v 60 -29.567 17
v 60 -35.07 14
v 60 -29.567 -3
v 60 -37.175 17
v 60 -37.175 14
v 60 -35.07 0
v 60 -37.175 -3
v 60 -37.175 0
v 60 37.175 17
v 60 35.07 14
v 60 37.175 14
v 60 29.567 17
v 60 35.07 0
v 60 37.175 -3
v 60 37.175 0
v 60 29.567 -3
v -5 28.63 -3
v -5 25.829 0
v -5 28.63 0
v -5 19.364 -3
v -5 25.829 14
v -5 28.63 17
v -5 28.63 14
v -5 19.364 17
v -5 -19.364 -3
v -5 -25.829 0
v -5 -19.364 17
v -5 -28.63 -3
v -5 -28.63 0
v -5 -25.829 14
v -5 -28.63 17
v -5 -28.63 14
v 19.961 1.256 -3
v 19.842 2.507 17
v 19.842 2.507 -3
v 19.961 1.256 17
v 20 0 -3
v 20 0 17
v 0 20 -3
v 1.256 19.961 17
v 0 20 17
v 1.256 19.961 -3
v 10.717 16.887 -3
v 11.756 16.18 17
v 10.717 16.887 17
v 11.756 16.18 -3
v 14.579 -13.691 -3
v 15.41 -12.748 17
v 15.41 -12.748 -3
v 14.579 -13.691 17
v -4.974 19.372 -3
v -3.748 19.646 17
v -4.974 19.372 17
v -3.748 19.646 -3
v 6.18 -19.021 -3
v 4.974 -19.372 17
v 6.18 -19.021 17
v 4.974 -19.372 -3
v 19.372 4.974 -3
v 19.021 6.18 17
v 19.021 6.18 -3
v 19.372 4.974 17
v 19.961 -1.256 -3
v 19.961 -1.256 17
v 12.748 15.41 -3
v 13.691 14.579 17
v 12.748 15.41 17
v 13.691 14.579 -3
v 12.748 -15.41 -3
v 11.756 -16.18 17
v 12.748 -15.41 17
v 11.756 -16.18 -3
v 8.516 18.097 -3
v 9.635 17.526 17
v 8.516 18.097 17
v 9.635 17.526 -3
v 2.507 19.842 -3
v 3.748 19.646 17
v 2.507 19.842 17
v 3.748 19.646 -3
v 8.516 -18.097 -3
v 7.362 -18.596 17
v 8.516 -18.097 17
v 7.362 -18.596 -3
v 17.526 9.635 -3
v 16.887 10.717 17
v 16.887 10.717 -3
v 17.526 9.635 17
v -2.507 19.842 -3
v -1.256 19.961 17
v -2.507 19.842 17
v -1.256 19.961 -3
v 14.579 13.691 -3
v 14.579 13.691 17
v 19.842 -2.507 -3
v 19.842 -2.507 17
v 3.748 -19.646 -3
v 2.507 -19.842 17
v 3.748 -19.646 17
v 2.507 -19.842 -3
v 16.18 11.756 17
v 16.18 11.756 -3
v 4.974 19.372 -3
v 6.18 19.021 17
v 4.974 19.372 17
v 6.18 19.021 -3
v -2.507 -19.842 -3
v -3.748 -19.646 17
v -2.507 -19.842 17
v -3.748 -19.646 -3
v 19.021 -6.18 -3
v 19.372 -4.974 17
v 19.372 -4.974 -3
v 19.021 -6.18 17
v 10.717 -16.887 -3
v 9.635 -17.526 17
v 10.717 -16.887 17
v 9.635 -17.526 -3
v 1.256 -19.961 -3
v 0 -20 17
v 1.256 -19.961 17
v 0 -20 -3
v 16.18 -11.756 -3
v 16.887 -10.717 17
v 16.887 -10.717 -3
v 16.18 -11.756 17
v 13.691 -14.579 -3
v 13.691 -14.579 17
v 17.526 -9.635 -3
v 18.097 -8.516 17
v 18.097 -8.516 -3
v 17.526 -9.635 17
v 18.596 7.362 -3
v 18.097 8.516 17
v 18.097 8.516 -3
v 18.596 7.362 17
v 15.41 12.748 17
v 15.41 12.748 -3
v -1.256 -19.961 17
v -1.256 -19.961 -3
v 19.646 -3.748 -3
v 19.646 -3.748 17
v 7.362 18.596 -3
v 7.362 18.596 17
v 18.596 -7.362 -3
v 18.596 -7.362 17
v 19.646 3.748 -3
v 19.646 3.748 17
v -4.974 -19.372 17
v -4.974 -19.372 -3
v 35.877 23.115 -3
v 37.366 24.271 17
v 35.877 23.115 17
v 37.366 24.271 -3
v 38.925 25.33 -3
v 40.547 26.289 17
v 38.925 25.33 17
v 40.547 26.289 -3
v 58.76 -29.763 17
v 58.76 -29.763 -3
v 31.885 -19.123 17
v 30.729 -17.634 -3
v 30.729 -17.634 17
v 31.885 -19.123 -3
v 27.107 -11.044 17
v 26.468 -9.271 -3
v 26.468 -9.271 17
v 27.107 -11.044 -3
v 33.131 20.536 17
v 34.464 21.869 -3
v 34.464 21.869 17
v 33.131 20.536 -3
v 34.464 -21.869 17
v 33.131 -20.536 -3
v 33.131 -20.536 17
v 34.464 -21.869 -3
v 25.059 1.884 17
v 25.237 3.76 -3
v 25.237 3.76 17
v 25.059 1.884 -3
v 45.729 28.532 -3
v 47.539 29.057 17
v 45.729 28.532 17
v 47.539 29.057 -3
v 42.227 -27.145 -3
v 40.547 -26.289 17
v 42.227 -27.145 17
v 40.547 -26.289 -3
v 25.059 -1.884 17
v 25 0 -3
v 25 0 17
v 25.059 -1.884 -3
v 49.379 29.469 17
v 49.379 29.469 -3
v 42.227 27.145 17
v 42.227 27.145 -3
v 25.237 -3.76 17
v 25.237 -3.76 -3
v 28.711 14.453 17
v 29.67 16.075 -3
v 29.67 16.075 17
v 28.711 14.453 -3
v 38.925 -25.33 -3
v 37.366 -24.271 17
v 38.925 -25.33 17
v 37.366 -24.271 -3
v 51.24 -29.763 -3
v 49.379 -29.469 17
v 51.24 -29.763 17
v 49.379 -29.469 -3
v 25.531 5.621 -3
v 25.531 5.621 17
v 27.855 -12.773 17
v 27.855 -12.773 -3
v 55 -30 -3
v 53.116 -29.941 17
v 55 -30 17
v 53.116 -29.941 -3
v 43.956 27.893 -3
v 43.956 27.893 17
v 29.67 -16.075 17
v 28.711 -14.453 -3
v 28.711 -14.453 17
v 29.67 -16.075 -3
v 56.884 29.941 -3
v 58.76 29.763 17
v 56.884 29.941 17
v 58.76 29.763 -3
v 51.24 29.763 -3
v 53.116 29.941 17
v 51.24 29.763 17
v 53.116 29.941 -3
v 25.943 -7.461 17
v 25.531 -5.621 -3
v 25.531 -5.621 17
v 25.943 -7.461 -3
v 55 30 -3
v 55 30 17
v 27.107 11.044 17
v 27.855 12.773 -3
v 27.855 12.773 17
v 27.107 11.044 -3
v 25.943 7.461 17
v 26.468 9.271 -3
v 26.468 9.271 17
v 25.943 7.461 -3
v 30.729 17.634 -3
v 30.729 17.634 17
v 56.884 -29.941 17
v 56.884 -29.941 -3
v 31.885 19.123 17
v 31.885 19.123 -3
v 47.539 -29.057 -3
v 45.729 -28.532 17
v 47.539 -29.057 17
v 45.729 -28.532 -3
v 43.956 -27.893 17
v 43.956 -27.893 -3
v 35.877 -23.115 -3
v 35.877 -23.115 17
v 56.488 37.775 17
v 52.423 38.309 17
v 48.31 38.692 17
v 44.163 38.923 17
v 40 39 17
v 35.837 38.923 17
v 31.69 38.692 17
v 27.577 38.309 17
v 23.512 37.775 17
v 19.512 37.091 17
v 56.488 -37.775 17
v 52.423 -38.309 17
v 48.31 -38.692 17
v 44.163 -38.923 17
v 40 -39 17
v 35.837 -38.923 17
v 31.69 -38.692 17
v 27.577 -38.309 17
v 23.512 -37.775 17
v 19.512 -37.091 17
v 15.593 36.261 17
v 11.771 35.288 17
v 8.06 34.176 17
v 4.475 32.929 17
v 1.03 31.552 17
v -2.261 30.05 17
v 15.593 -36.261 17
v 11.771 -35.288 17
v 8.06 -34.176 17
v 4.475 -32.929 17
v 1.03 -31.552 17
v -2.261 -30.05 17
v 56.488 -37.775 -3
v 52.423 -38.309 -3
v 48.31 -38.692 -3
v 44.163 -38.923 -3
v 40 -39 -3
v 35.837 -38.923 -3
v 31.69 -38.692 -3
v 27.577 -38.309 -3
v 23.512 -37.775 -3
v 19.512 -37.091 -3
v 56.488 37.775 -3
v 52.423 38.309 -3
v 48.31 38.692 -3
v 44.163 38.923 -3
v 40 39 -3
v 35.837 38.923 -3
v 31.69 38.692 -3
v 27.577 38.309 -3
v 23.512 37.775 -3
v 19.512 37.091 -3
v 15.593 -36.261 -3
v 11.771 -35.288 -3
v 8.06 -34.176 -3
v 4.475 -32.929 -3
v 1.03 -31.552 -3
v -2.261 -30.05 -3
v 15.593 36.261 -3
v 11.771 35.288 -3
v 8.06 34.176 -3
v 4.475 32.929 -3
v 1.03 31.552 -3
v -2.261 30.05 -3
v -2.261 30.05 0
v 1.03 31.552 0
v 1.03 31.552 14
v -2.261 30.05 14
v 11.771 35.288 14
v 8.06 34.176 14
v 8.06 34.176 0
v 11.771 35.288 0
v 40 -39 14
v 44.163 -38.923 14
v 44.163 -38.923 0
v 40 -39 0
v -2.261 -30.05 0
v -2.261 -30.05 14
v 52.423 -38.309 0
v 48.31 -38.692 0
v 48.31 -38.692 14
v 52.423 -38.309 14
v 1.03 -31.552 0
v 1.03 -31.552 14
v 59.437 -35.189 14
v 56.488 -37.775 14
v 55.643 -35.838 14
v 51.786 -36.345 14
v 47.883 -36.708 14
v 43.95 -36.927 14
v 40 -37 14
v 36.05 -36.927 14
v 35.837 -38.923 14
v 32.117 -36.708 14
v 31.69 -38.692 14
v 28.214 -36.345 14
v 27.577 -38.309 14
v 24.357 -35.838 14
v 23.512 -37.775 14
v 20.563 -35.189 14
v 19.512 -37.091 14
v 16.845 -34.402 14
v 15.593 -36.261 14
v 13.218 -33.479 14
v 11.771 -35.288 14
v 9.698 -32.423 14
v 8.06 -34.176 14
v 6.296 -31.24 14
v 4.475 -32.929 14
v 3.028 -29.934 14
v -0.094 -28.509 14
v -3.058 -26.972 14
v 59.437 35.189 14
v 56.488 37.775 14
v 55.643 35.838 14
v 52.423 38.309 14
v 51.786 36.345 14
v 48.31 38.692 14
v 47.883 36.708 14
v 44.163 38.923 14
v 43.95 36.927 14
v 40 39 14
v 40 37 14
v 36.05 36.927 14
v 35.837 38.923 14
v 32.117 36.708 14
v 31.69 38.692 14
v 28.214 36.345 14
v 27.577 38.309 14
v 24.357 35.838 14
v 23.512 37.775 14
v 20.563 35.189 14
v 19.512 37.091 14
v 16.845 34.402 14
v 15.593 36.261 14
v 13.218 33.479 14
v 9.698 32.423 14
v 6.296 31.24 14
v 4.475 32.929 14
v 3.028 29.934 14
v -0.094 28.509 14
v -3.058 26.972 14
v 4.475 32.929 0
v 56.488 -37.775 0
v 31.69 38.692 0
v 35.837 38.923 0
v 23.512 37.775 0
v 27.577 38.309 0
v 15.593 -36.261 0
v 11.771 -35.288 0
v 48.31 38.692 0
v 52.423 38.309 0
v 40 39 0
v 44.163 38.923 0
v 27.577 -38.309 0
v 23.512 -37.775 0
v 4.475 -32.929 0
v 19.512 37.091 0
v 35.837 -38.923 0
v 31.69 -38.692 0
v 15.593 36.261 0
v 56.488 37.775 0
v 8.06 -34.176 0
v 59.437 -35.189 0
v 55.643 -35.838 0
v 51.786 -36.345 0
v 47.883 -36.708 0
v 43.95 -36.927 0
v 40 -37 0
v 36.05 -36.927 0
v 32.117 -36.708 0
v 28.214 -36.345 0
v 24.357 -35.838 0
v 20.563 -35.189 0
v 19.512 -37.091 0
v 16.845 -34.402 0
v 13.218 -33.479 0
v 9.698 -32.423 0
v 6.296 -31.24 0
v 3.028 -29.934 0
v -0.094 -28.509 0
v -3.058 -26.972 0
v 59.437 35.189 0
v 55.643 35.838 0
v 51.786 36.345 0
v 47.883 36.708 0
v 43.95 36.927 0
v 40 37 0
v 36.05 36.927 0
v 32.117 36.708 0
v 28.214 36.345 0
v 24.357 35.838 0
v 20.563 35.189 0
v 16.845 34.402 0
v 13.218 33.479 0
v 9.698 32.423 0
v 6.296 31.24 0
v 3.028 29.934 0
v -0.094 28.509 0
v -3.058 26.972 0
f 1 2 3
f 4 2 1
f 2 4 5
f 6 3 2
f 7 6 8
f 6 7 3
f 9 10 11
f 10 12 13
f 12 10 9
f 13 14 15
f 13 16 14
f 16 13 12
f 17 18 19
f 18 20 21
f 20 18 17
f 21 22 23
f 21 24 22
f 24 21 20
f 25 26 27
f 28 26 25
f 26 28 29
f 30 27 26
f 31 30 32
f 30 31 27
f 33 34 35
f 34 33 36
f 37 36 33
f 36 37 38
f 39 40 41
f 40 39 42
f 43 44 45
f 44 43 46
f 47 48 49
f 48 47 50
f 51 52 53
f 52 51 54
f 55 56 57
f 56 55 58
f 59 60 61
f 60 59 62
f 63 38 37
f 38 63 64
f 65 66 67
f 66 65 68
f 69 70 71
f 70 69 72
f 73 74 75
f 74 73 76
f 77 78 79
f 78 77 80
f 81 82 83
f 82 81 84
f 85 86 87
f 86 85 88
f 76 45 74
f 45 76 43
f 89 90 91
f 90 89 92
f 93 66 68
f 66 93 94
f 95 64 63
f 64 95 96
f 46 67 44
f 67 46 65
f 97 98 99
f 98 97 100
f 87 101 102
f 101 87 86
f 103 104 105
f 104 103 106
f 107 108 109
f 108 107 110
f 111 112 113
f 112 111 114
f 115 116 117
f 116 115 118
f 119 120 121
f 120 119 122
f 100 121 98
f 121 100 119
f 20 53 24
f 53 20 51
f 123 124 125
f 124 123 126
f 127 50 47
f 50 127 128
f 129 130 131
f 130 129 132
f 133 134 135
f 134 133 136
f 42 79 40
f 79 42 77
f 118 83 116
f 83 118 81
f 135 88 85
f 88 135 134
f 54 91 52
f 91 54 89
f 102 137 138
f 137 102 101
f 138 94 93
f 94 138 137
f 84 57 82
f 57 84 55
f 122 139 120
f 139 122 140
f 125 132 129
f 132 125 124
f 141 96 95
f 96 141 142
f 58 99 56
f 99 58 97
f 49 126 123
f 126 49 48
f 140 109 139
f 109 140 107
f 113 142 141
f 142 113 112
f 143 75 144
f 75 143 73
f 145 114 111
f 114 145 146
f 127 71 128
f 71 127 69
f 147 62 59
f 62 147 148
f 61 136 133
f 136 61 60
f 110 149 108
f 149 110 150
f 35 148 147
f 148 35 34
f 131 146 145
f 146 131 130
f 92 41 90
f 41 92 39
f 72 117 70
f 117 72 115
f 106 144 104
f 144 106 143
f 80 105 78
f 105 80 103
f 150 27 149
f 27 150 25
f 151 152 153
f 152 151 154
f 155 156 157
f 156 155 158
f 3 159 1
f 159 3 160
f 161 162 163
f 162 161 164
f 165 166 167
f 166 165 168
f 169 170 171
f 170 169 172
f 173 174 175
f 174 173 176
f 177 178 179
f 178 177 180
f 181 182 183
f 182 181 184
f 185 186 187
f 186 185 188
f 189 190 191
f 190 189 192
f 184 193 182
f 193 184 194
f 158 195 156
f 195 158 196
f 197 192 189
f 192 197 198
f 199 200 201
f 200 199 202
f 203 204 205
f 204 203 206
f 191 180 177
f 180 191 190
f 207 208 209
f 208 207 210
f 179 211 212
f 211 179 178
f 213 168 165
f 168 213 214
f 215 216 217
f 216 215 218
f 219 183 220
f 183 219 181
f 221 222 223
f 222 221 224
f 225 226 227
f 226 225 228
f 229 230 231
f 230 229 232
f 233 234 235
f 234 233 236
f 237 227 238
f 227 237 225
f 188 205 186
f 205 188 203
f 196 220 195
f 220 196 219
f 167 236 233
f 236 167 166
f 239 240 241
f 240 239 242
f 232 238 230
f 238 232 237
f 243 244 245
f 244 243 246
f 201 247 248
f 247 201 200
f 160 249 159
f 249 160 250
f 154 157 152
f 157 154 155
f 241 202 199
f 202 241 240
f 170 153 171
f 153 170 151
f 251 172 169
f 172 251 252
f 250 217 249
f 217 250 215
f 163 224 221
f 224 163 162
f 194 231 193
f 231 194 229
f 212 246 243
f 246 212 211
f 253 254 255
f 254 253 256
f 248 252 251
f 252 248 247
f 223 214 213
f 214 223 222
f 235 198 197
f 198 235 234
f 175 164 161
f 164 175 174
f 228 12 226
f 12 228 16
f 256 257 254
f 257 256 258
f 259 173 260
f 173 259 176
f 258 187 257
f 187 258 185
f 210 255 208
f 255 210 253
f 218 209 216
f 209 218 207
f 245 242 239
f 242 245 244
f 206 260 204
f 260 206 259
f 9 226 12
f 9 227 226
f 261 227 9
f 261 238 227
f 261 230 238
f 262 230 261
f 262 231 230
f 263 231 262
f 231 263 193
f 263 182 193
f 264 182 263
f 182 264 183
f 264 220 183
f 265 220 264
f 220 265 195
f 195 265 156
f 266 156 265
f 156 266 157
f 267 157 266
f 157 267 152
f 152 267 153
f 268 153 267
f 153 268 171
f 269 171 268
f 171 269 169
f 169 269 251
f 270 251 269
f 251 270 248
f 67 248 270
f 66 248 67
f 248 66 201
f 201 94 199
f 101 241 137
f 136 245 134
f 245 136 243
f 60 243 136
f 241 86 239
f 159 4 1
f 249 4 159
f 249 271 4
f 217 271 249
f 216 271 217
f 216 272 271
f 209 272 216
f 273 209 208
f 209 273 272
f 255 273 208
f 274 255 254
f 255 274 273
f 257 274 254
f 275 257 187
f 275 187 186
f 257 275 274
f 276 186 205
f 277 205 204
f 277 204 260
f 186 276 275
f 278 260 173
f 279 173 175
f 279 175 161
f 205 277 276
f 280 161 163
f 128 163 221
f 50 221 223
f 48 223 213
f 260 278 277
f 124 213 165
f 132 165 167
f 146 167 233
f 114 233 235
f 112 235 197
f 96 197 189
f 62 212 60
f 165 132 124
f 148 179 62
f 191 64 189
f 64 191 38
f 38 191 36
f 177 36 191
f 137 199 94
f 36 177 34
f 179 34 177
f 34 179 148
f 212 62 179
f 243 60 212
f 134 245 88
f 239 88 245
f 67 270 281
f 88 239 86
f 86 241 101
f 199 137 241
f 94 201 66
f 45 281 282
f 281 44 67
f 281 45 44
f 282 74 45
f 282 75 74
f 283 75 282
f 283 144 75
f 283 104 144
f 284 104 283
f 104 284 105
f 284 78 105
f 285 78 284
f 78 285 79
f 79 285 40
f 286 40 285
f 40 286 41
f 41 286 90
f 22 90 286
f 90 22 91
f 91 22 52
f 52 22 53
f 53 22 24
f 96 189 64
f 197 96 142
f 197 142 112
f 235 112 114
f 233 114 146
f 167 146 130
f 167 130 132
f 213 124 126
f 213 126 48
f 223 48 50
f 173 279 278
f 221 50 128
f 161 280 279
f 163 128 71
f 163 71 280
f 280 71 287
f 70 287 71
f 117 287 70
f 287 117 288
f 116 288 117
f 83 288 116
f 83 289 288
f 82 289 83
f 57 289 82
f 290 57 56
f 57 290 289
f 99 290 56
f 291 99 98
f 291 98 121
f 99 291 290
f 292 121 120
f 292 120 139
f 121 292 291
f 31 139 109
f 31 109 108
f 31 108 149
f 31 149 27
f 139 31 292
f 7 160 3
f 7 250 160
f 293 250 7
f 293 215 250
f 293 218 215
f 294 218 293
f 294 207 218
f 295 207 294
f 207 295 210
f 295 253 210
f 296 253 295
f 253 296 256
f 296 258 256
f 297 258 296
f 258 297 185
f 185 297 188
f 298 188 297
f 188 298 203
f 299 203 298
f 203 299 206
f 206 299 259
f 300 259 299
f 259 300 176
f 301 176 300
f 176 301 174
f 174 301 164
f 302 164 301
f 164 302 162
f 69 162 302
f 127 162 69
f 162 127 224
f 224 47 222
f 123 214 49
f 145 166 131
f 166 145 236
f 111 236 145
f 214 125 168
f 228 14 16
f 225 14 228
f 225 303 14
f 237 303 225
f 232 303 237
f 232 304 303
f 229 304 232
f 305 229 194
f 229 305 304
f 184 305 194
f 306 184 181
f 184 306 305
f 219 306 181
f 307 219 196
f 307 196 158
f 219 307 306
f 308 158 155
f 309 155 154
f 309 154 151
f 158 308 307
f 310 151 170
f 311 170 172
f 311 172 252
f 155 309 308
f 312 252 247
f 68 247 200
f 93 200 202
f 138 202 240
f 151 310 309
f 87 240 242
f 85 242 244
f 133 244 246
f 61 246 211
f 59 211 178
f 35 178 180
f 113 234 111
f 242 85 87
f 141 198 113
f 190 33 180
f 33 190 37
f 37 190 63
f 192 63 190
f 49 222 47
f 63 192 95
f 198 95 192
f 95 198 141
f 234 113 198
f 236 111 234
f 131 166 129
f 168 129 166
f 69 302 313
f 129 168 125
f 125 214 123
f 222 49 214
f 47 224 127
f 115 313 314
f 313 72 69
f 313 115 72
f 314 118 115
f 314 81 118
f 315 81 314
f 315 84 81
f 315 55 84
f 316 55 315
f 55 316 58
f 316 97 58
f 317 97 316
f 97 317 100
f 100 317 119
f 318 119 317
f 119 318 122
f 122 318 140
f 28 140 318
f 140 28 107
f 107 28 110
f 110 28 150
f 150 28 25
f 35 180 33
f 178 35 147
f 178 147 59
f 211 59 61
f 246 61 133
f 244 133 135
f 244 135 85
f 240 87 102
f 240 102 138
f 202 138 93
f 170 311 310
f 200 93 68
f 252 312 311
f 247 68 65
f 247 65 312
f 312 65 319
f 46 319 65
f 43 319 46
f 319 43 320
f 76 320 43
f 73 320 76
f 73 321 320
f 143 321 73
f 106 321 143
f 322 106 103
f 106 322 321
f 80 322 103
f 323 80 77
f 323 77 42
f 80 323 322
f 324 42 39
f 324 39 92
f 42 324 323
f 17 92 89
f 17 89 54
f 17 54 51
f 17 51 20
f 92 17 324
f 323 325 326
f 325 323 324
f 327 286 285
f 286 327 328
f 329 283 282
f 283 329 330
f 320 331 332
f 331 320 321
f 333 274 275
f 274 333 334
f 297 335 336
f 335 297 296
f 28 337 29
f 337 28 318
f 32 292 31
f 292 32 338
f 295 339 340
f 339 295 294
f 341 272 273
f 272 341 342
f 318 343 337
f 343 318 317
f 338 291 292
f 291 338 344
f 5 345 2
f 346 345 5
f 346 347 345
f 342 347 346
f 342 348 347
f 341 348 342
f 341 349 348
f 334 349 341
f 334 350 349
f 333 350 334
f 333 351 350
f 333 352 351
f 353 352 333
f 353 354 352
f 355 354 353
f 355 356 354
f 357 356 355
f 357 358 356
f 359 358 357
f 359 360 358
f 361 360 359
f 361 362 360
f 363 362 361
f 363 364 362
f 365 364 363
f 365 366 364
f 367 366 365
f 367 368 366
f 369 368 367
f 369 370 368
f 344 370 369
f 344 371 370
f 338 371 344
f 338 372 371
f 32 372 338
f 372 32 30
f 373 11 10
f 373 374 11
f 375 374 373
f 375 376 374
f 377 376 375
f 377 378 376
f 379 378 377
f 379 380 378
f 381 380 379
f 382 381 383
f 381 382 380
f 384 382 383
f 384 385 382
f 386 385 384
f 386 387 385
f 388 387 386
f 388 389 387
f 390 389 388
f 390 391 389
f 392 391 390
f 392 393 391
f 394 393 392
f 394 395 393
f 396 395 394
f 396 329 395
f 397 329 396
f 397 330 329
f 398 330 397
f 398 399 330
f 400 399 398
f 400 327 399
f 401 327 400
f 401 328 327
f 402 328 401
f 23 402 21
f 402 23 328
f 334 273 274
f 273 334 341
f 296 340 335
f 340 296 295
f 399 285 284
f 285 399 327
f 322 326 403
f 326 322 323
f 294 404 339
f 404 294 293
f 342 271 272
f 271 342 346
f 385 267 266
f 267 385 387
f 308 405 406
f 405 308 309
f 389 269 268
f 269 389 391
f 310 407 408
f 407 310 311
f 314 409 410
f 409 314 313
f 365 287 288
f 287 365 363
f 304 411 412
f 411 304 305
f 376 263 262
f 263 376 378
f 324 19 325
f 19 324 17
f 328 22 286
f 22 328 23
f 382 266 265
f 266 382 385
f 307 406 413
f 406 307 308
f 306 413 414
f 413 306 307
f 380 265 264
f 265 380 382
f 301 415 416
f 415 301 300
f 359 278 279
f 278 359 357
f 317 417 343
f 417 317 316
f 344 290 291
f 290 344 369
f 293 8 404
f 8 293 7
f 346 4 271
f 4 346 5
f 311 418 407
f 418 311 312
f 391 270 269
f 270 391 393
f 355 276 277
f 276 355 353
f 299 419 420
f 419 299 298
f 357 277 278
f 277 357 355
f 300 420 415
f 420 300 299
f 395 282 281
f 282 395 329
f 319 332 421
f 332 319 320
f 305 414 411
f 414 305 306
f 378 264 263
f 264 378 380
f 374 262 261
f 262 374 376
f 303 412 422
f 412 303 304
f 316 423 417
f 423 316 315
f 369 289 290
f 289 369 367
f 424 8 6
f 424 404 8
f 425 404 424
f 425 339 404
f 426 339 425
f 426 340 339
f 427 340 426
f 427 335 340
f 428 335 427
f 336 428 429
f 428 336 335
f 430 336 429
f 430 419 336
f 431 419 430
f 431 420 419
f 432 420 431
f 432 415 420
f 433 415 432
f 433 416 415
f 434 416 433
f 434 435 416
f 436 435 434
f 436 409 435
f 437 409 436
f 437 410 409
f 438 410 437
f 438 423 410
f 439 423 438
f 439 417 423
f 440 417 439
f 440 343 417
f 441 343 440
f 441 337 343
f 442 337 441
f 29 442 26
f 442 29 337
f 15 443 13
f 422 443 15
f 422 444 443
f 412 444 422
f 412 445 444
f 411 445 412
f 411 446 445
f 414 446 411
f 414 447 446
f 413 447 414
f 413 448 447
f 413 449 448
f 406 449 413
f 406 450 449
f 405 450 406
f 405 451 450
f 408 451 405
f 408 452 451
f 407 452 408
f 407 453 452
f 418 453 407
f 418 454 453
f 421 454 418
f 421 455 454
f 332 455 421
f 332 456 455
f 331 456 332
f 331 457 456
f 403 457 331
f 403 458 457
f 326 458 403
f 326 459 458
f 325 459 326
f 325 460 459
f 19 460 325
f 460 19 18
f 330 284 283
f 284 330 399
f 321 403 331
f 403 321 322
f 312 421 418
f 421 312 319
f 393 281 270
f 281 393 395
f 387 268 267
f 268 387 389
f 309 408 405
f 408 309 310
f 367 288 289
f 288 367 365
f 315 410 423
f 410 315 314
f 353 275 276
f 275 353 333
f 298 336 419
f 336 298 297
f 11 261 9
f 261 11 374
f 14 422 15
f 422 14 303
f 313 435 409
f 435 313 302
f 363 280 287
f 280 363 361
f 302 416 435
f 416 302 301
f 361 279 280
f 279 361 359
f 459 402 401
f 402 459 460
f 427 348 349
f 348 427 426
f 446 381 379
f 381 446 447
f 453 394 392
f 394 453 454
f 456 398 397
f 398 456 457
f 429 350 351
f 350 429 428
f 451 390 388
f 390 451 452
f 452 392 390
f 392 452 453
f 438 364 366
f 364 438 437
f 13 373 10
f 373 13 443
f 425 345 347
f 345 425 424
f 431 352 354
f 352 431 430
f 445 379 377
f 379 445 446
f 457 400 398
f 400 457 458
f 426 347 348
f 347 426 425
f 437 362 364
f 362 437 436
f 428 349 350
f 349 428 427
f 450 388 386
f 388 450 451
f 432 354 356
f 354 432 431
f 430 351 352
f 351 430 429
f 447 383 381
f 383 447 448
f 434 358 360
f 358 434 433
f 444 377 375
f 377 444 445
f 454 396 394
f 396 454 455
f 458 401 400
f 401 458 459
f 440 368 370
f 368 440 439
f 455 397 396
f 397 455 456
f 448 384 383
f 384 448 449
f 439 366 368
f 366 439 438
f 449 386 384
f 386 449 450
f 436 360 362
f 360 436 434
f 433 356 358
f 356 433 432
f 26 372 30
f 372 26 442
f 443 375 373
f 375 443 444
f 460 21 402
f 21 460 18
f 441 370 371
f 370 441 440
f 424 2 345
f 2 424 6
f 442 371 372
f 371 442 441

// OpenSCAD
$fn=100;

//Stand off for quick deploy stations but also holds everything in place for 


//tripod radii (R1) are 17.5, 19, 21
//PVC radii (R2) are 16.5, 20
//2" Galvanized Post is 50.8
//2" PVC radii is 30
//cube offset (CuO) = 5
CuO = 5;
R1 = 20; 
R2 = 30;



// Do not change anything below
//center offset (CeO) = 19 + 20 + 10 = 49
CeO = CuO+R1+R2;
//cube length (CL) = CeO + CuO*2
CL = CeO + CuO*2;


intersection(){
    difference(){
        union(){
            
            // main block
            difference(){
                translate([-CuO,-CL,0]) cube([CL,CL*2,15]);
                translate([0,0,-1]) cylinder(20,R1,R1);
                translate([CeO,0,-1]) cylinder(20,R2,R2);
                }
            // bottom hose clamp holder
            translate([0,0,14]) difference(){
                translate([-CuO,-CL,0]) cube([CL,CL*2,3]);
                translate([0,0,-1]) cylinder(20,R1,R1);
                translate([CeO,0,-1]) cylinder(20,R2,R2);
                }
            // top hose clamp holder
            translate([0,0,-3]) difference(){
                translate([-CuO,-CL,0]) cube([CL,CL*2,3]);
                translate([0,0,-1]) cylinder(20,R1,R1);
                translate([CeO,0,-1]) cylinder(20,R2,R2);
                }
        }
        
        // creates the hose clamp cut and oval shape
        difference(){
        translate([CeO-15,0,0])
        scale([1.70, 1, 1])  // Stretches the cylinder in X direction
            cylinder(h = 14, r = R2+9);
        
        translate([CeO-15,0,-0.1])
        scale([1.70, 1, 1])  // Stretches the cylinder in X direction
            cylinder(h = 14.2, r = R2+7);
        }
    
    }

    // creates oval shape
    translate([CeO-15,0,-3])
    scale([1.7, 1, 1])  // Stretches the cylinder in X direction
        cylinder(h = 20, r = R2+9);
}
